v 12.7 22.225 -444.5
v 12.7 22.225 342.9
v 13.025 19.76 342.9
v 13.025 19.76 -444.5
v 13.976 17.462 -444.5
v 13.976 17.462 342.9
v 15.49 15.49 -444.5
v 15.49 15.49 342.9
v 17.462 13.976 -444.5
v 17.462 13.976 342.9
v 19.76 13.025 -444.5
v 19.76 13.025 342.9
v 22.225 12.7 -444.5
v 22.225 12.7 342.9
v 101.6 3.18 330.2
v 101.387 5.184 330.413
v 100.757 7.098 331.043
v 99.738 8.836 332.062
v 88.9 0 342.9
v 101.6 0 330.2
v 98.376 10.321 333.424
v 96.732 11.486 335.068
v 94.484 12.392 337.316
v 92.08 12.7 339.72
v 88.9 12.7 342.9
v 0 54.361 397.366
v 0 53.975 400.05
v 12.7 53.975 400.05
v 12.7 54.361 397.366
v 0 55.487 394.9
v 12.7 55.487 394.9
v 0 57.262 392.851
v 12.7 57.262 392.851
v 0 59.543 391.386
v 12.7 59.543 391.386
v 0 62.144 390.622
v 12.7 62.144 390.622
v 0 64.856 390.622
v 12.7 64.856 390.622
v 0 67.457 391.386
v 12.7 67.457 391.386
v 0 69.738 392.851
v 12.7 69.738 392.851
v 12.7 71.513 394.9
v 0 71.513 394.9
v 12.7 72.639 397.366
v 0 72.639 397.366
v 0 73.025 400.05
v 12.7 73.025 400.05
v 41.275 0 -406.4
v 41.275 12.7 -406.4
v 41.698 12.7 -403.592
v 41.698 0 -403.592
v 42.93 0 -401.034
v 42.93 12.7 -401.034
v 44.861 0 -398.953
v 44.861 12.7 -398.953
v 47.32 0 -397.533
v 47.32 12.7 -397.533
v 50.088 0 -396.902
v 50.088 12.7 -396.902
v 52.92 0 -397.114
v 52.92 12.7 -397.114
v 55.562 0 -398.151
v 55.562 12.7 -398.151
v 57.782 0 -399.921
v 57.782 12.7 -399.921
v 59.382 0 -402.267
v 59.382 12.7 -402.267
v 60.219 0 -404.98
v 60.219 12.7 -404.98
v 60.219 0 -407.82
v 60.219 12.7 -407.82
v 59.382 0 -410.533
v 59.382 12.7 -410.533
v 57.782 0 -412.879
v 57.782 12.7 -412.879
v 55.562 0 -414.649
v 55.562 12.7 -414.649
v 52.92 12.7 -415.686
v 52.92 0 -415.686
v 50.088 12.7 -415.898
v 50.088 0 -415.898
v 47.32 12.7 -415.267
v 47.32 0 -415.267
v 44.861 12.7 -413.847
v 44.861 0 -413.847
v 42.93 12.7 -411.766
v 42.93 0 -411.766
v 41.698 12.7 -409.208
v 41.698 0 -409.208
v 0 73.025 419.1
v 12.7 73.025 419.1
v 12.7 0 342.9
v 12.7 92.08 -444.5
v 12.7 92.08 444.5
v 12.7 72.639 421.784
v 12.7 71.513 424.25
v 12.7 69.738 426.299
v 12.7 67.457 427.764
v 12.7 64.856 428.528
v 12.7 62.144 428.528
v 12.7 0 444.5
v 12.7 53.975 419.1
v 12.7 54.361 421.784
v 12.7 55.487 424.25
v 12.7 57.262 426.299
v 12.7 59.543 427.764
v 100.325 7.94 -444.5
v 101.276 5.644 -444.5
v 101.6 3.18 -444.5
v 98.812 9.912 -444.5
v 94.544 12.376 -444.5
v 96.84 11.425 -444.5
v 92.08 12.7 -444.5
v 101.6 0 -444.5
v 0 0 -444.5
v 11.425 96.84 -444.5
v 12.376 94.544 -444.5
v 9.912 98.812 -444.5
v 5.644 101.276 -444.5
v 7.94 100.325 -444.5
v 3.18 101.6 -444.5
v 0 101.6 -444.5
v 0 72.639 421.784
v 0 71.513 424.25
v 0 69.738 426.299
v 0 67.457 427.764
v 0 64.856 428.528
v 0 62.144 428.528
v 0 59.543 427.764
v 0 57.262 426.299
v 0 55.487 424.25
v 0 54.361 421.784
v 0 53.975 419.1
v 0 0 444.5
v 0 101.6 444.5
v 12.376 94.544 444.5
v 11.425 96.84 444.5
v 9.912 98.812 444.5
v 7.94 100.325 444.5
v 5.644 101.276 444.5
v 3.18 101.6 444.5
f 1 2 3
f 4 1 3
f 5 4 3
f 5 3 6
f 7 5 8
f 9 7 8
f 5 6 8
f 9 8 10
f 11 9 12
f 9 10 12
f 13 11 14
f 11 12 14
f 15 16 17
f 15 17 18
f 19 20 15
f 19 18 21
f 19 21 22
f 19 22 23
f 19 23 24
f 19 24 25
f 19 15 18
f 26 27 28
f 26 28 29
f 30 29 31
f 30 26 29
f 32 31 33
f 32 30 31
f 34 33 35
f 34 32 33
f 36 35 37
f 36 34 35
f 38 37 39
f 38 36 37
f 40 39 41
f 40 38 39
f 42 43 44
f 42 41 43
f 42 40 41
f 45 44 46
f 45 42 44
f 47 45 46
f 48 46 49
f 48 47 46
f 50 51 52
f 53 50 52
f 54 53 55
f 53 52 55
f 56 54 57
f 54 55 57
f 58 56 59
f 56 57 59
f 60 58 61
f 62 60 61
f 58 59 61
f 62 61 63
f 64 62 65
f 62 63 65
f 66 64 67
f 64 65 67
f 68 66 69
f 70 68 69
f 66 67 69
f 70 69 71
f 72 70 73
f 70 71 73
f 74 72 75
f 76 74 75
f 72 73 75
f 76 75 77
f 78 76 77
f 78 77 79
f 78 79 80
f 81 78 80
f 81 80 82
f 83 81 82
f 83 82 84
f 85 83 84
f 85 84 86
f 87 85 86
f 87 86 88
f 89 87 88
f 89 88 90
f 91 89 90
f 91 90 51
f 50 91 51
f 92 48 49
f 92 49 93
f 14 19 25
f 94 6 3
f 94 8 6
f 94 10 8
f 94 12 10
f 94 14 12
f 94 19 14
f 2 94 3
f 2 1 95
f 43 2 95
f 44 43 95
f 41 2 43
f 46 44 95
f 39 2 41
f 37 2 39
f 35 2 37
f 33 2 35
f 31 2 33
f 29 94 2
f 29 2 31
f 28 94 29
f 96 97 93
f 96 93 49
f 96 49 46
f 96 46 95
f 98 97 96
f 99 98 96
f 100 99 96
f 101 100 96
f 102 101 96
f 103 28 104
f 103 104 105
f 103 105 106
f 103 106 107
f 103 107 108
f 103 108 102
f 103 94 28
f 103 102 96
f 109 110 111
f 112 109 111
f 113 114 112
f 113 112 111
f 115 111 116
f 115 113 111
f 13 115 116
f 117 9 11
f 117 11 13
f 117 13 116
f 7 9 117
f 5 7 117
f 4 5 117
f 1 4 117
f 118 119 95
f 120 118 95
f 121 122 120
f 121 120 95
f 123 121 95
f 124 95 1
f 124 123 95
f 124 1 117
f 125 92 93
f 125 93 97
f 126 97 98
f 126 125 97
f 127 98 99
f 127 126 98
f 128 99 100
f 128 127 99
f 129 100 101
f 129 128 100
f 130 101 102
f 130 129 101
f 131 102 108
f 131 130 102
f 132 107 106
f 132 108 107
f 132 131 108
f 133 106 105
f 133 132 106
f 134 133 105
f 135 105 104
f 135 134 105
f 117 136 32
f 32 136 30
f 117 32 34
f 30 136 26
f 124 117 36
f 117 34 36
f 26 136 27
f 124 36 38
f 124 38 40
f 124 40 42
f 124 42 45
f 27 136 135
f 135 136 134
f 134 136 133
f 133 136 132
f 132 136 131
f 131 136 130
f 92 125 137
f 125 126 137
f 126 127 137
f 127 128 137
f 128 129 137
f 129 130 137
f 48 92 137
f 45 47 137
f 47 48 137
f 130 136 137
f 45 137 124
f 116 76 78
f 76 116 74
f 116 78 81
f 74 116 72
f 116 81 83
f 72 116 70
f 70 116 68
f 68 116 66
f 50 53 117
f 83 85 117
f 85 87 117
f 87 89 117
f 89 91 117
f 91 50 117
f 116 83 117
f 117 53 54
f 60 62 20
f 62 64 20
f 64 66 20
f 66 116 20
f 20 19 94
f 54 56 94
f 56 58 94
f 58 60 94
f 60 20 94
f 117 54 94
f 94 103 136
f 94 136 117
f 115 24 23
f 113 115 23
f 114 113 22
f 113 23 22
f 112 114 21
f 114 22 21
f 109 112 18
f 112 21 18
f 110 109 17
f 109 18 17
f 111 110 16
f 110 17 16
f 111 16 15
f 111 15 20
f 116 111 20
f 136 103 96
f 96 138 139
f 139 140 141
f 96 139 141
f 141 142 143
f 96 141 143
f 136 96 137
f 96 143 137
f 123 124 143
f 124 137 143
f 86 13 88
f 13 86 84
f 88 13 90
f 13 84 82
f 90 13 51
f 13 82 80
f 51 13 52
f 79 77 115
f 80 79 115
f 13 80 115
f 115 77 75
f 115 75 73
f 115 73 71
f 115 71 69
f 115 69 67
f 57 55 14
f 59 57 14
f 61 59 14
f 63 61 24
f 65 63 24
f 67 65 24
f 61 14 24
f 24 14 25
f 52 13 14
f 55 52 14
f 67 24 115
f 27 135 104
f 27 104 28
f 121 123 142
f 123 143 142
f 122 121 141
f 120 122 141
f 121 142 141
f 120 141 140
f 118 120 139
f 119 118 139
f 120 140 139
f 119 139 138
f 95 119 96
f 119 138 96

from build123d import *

# Parameters (mm, degrees)
BOSS_EXTRUDE1_DEPTH             = 444.5
CUT_EXTRUDE1_REACH              = 103.6
CUT_EXTRUDE2_REACH              = 103.6
F_3_4_0_75_DIAMETER_HOLE1_D     = 19.05
F_3_4_0_75_DIAMETER_HOLE1_DEPTH = 50.8
F_3_4_0_75_DIAMETER_HOLE1_TIP   = 5.723197396


with BuildPart() as part:
    # Sketch1 → Boss-Extrude1 (new body, symmetric)
    with BuildSketch(Plane.XY):
        with BuildLine():
            Line((0, 0), (0, 101.6))
            Line((0, 101.6), (3.18008, 101.6))
            ThreePointArc((3.18008, 101.6), (9.911679988, 98.811679988), (12.7, 92.08008))
            Line((12.7, 92.08008), (12.7, 22.225))
            ThreePointArc((12.7, 22.225), (15.489807909, 15.489807909), (22.225, 12.7))
            Line((22.225, 12.7), (92.08008, 12.7))
            ThreePointArc((92.08008, 12.7), (98.811679988, 9.911679988), (101.6, 3.18008))
            Line((101.6, 3.18008), (101.6, 0))
            Line((101.6, 0), (0, 0))
        make_face()
    extrude(amount=BOSS_EXTRUDE1_DEPTH, both=True)

    # Sketch2 → Cut-Extrude1 (cut, up to next)
    with BuildSketch(Plane.XZ, mode=Mode.PRIVATE) as cut_extrude1_sk1:
        Polygon((88.9, 342.9), (12.7, 342.9), (12.7, 444.5), (101.6, 444.5), (101.6, 342.9), (101.6, 330.2), align=None)
    cut_extrude1_tool1 = extrude(cut_extrude1_sk1.sketch, amount=-CUT_EXTRUDE1_REACH, mode=Mode.PRIVATE) & part.part
    add(cut_extrude1_tool1.solids().sort_by_distance((57.5059, 0, 393.212979))[0], mode=Mode.SUBTRACT)

    # Sketch3 → Cut-Extrude2 (cut, up to next)
    with BuildSketch(Plane.ZY, mode=Mode.PRIVATE) as cut_extrude2_sk1:
        with BuildLine():
            Line((419.1, 53.975), (400.05, 53.975))
            ThreePointArc((400.05, 53.975), (390.525, 63.5), (400.05, 73.025))
            Line((400.05, 73.025), (419.1, 73.025))
            ThreePointArc((419.1, 73.025), (428.625, 63.5), (419.1, 53.975))
        make_face()
    cut_extrude2_tool1 = extrude(cut_extrude2_sk1.sketch, amount=-CUT_EXTRUDE2_REACH, mode=Mode.PRIVATE) & part.part
    add(cut_extrude2_tool1.solids().sort_by_distance((0, 63.5, 409.575))[0], mode=Mode.SUBTRACT)

    # 3/4 (0.75) Diameter Hole1
    with Locations(Plane.XZ):
        with Locations((50.8, -406.4)):
            Hole(F_3_4_0_75_DIAMETER_HOLE1_D / 2, depth=F_3_4_0_75_DIAMETER_HOLE1_DEPTH)
            with Locations((0, 0, -(F_3_4_0_75_DIAMETER_HOLE1_DEPTH + F_3_4_0_75_DIAMETER_HOLE1_TIP / 2))):  # 118° drill point
                Cone(0, F_3_4_0_75_DIAMETER_HOLE1_D / 2, F_3_4_0_75_DIAMETER_HOLE1_TIP, mode=Mode.SUBTRACT)


solid = part.part
